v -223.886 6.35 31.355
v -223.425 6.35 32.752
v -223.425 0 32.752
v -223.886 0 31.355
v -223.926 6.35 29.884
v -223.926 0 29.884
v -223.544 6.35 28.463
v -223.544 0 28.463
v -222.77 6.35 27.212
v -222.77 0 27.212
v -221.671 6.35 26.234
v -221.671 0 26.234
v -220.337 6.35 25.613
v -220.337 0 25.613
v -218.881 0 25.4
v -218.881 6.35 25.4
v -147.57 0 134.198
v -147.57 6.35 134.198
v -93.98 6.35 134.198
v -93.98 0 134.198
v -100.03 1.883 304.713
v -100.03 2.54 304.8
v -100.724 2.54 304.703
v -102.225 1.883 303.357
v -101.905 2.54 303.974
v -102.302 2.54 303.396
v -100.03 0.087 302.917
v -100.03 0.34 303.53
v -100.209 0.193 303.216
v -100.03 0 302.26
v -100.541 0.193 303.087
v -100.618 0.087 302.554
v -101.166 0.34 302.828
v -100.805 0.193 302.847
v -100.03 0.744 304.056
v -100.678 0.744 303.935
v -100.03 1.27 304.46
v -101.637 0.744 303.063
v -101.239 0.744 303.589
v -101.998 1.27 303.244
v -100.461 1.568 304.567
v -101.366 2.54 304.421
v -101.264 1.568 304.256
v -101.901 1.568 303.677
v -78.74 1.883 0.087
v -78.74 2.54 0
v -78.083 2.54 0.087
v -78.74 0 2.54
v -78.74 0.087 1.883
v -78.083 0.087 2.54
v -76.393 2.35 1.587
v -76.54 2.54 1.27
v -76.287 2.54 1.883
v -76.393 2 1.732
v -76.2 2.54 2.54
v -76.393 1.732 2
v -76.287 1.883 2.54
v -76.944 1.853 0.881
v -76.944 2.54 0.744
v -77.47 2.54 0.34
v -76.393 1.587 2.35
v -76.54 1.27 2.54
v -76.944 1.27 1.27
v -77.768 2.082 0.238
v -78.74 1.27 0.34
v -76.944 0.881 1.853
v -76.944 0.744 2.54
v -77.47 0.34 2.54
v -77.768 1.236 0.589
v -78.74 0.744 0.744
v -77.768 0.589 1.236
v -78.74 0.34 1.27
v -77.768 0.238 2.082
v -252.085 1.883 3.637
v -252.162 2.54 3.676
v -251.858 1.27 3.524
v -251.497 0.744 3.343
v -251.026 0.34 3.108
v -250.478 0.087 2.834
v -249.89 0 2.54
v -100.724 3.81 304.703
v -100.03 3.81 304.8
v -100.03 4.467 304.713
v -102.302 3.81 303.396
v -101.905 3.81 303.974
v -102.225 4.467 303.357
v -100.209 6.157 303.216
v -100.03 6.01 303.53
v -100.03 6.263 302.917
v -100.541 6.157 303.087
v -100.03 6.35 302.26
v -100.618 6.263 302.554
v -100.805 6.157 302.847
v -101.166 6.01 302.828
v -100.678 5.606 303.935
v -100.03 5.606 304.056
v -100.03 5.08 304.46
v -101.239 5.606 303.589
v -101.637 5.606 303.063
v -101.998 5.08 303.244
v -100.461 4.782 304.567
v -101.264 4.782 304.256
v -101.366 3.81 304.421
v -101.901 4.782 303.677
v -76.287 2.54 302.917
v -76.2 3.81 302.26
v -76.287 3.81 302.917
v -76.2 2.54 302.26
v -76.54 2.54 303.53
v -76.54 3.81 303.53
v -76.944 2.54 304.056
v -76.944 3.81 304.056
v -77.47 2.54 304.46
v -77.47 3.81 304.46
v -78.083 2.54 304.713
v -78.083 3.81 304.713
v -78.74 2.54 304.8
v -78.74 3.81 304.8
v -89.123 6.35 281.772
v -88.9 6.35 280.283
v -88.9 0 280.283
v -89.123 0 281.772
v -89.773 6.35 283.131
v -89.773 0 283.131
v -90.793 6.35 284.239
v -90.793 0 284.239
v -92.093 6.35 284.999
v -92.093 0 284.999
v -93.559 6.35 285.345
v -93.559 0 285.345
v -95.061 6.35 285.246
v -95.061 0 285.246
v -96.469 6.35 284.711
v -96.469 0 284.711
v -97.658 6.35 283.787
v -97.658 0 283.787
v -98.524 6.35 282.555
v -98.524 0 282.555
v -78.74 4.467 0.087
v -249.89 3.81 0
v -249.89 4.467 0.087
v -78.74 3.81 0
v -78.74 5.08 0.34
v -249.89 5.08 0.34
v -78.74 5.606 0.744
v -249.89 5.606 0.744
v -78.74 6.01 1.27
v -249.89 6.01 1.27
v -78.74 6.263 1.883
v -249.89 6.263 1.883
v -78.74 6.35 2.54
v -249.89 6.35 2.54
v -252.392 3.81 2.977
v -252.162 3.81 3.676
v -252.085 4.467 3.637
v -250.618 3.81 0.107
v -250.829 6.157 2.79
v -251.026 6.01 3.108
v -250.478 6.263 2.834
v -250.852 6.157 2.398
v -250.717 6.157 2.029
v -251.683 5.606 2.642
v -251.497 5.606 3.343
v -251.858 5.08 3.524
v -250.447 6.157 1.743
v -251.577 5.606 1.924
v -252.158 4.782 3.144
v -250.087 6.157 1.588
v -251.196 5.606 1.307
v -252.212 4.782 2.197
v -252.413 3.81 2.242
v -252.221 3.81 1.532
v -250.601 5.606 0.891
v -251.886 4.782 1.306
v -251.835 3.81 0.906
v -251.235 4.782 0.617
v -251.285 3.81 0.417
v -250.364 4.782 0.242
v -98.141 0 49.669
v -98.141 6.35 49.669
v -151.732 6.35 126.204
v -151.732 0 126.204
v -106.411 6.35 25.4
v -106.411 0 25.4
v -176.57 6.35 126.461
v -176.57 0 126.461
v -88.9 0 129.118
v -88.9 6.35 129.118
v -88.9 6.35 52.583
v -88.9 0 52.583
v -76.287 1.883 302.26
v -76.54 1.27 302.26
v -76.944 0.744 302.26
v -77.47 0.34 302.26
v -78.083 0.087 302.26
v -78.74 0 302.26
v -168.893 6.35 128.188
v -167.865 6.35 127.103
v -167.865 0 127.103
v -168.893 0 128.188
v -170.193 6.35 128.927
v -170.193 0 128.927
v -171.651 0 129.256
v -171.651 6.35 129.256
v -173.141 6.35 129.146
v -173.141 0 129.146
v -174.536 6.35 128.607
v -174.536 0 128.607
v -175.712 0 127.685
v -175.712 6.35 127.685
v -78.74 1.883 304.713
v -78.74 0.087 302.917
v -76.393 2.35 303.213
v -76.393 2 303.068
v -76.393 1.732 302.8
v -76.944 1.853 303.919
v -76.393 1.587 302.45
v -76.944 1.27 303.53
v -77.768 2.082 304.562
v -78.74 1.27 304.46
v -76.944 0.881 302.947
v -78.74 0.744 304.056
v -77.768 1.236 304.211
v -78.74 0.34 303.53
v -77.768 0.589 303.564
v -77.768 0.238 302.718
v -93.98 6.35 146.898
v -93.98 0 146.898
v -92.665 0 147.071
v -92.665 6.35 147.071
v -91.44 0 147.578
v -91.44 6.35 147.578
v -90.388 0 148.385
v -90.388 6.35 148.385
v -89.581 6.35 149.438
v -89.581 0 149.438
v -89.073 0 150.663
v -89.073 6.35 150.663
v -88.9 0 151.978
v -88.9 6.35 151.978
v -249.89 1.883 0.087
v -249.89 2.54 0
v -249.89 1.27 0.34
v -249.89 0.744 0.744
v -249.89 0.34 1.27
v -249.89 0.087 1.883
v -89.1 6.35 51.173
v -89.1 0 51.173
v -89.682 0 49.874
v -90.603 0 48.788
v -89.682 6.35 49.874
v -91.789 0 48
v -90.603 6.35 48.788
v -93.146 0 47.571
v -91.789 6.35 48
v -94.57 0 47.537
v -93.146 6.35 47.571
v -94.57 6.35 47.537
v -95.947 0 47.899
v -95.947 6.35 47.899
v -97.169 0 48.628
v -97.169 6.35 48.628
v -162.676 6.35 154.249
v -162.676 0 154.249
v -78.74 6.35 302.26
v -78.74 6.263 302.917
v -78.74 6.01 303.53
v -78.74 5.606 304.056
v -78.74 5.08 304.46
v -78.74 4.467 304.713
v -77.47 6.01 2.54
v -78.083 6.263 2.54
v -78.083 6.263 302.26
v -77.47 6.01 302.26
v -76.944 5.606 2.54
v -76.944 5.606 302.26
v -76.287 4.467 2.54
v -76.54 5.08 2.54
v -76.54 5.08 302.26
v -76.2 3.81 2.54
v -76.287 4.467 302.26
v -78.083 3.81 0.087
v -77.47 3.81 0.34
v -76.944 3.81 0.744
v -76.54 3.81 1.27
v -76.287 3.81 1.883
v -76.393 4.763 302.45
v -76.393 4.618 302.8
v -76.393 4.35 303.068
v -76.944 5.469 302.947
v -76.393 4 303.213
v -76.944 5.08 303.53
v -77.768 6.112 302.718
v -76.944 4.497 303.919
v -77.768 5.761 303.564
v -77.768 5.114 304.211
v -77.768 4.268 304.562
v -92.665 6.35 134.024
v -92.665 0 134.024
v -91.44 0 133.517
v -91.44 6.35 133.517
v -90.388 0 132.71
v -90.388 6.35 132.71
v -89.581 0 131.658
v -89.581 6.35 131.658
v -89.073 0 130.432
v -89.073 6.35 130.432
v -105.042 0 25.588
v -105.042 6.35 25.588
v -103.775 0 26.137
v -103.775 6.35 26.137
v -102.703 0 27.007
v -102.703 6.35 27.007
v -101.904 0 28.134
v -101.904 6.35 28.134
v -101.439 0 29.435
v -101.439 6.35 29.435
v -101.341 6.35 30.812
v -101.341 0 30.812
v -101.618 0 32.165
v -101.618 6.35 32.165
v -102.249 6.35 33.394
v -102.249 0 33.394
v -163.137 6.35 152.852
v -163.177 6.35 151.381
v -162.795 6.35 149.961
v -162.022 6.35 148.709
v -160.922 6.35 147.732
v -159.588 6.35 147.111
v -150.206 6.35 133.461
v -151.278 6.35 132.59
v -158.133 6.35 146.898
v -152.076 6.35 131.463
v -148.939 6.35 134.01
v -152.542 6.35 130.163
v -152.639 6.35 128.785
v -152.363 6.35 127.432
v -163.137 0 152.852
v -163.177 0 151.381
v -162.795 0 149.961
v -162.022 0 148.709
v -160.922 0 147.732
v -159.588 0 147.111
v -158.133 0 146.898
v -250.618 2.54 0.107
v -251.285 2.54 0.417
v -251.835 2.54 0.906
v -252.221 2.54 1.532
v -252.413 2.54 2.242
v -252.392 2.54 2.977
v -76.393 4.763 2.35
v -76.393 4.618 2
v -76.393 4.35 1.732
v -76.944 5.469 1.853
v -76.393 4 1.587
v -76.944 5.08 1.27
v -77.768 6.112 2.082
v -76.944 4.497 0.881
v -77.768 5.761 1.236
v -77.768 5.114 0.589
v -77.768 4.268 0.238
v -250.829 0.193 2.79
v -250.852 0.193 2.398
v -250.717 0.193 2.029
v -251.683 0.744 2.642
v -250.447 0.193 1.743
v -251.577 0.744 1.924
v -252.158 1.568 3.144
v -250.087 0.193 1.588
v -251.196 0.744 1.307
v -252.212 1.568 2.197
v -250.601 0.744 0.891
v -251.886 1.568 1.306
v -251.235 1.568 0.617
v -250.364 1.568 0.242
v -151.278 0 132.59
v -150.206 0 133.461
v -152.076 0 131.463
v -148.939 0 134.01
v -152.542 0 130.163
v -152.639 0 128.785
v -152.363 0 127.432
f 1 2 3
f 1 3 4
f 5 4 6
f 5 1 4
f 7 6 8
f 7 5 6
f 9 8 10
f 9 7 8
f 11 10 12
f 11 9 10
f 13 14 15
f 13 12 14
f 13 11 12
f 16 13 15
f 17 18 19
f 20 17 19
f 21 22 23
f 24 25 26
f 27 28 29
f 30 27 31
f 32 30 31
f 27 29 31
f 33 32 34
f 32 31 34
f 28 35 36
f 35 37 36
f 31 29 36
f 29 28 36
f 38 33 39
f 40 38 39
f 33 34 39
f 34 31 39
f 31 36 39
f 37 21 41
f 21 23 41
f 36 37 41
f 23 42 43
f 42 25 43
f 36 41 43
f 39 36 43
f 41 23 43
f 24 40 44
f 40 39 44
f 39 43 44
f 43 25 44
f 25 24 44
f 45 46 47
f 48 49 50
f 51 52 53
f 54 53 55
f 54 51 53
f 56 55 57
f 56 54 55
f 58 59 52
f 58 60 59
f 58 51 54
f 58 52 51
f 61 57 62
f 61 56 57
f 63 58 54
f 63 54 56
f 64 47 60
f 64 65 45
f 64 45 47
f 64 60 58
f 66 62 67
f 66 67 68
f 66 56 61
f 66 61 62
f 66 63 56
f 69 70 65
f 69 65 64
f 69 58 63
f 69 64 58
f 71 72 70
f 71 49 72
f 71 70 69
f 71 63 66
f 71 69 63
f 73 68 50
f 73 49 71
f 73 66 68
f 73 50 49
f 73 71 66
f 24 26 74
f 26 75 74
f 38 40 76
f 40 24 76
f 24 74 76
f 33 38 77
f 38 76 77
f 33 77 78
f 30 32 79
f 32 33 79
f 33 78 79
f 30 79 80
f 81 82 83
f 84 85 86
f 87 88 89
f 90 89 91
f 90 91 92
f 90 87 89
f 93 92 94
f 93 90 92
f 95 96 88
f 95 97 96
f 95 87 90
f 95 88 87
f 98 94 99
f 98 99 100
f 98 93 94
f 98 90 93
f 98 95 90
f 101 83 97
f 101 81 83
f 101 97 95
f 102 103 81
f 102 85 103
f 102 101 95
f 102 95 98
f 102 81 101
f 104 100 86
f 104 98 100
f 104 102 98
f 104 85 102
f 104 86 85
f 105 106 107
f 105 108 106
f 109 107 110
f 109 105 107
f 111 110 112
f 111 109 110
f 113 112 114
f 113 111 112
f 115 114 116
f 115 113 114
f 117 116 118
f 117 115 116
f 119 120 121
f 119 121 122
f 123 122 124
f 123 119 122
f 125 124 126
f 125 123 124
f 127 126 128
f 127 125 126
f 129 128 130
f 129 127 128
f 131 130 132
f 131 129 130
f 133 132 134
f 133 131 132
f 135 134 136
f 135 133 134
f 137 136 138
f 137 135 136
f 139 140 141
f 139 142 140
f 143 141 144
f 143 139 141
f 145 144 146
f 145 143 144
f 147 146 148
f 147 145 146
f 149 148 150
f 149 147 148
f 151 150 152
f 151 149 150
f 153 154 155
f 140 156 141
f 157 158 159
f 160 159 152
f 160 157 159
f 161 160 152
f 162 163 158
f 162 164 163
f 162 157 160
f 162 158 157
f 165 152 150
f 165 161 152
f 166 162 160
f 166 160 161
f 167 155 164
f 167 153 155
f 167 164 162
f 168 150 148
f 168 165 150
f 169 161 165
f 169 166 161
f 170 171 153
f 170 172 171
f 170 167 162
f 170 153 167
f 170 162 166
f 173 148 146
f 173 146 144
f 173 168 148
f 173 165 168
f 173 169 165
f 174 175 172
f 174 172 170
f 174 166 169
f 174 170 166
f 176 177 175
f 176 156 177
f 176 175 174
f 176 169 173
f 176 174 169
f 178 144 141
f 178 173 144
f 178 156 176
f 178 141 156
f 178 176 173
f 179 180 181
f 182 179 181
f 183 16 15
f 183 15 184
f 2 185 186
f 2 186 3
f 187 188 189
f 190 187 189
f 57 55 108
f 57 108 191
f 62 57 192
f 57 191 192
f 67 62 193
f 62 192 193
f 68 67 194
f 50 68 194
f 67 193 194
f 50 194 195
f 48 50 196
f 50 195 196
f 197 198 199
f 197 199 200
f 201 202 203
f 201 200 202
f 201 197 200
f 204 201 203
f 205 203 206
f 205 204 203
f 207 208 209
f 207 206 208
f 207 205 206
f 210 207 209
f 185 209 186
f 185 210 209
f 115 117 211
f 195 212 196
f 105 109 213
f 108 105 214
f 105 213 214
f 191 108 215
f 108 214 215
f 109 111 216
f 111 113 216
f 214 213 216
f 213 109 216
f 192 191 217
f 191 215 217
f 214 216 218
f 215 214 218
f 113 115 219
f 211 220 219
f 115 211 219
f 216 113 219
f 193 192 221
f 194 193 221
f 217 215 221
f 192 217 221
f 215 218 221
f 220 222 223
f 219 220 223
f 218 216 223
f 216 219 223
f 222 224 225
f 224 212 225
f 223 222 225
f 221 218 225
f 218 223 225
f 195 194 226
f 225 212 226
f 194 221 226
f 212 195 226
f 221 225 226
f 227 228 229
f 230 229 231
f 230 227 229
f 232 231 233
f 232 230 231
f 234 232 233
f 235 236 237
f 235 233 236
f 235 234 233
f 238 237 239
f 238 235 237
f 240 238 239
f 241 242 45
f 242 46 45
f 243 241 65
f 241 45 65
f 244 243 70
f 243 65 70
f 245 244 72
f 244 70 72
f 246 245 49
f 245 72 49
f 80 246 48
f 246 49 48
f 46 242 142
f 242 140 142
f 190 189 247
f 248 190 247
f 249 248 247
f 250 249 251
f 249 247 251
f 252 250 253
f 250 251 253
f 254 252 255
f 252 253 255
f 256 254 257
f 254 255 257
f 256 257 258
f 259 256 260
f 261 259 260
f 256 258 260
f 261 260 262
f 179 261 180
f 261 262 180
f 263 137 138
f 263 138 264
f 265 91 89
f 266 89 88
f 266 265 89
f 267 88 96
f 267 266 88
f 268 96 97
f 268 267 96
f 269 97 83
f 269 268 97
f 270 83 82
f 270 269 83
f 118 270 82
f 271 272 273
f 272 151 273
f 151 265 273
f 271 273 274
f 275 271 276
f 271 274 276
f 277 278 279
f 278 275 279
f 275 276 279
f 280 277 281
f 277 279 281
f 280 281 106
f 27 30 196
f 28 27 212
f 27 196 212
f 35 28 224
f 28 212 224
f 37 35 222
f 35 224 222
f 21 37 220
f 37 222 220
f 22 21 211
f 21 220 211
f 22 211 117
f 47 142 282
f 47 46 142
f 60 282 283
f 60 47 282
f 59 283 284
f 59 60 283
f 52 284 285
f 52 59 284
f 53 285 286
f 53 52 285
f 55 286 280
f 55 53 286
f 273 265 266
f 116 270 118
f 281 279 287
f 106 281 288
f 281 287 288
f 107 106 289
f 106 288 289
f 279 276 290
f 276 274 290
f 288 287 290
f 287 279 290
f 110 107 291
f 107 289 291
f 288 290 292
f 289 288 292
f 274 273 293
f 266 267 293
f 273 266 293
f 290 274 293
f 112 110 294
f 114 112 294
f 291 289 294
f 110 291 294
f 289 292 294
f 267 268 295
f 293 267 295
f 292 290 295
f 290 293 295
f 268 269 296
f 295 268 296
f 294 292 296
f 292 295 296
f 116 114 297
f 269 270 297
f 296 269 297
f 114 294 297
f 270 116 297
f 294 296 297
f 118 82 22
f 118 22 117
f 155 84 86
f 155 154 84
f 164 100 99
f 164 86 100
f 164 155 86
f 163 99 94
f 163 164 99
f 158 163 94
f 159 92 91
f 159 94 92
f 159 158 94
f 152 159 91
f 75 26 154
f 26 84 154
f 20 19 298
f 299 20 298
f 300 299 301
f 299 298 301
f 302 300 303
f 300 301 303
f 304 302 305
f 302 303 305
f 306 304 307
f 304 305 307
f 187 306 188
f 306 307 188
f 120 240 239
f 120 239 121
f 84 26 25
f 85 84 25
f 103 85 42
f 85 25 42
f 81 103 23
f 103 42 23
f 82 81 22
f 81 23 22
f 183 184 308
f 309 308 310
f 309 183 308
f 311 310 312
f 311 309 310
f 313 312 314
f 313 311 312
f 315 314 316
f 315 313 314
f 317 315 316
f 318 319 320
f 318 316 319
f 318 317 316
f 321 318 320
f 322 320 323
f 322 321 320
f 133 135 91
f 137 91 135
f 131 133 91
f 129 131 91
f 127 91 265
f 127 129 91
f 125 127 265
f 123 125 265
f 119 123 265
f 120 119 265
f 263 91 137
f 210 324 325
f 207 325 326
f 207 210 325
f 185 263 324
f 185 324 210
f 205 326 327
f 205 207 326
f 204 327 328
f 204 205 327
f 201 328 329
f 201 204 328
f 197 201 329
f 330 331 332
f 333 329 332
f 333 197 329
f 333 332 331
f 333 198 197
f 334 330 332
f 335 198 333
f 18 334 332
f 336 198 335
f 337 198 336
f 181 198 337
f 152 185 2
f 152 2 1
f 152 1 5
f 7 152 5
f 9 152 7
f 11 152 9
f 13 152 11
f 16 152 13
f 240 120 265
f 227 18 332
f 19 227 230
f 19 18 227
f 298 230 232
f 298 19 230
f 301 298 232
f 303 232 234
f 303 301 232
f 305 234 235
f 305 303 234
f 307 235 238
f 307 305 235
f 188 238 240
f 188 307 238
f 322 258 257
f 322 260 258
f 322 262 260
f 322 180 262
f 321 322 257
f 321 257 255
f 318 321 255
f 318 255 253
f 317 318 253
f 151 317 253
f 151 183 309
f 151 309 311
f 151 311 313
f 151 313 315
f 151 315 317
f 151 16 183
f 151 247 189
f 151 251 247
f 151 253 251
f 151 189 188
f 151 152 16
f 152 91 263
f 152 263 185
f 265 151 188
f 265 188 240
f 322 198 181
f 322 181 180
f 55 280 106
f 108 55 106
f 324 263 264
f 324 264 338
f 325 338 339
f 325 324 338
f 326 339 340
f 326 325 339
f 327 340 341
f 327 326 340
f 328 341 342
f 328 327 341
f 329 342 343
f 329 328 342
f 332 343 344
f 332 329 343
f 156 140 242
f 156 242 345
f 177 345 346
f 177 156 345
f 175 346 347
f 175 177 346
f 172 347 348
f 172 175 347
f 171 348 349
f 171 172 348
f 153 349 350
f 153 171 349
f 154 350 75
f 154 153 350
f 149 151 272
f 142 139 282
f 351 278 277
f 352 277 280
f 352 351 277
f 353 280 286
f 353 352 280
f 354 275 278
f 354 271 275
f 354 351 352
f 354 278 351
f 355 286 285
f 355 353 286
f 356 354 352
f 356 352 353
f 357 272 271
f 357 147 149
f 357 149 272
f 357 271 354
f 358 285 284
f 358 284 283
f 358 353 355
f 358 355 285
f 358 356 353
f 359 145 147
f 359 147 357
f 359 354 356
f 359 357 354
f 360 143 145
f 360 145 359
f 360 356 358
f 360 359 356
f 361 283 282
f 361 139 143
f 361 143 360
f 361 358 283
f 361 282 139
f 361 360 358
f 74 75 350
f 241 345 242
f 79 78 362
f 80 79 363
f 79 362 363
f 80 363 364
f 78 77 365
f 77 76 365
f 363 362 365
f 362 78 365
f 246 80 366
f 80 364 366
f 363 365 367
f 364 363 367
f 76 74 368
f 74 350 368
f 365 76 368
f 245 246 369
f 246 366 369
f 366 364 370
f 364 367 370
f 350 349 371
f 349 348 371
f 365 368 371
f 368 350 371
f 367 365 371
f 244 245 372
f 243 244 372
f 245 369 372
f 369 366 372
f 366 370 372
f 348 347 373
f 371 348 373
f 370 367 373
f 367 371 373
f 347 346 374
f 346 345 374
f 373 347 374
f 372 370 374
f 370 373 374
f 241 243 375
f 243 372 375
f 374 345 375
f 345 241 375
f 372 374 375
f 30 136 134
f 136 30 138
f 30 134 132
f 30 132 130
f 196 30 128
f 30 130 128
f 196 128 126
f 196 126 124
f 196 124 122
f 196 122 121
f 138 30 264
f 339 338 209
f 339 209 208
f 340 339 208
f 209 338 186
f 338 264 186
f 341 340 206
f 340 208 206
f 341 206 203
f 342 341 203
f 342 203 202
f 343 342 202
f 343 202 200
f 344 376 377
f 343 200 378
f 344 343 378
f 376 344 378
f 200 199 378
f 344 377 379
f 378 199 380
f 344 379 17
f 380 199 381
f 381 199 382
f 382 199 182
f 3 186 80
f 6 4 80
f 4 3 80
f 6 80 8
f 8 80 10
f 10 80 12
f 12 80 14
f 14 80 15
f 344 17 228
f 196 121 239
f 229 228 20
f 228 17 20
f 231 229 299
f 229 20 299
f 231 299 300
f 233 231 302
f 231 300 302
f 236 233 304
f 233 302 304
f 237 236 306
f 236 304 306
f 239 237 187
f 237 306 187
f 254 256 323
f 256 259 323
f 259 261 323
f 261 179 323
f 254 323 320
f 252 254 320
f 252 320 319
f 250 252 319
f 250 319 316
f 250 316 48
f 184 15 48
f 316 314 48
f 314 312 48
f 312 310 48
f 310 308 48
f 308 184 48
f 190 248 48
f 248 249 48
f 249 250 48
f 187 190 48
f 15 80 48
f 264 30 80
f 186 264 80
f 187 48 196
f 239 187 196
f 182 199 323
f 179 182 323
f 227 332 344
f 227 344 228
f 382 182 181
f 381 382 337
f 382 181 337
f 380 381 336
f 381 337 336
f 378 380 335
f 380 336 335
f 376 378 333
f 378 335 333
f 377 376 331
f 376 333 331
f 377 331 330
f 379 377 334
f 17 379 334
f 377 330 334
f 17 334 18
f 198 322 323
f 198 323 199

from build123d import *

# Parameters (mm, degrees)
SKETCH1_W           = 254
SKETCH1_H           = 6.35
BOSS_EXTRUDE1_DEPTH = 304.8
CUT_EXTRUDE1_DEPTH  = 304.8
CUT_EXTRUDE2_DEPTH  = 397.811494919
CUT_EXTRUDE3_REACH  = 398.811
FILLET2_R           = 2.54


with BuildPart() as part:
    # Sketch1 → Boss-Extrude1 (new body)
    with BuildSketch(Plane.XY):
        with Locations((-127, 3.175)):
            Rectangle(SKETCH1_W, SKETCH1_H)
    extrude(amount=BOSS_EXTRUDE1_DEPTH)

    # Sketch2 → Cut-Extrude1 (cut)
    with BuildSketch(Plane(origin=(0, 6.35, 0), x_dir=(1, 0, 0), z_dir=(0, 1, 0))):
        Polygon((-101.6, -304.8), (-254, 0), (-254, -304.8), align=None)
    extrude(amount=-CUT_EXTRUDE1_DEPTH, mode=Mode.SUBTRACT)

    # Sketch4 → Cut-Extrude2 (cut, through all)
    with BuildSketch(Plane(origin=(0, 6.35, 0), x_dir=(1, 0, 0), z_dir=(0, 1, 0))):
        Polygon((-76.2, -127), (-76.2, 0), (0, 0), (0, -304.8), (-76.2, -304.8), (-76.2, -177.8), align=None)
    extrude(amount=-CUT_EXTRUDE2_DEPTH, mode=Mode.SUBTRACT)

    # Sketch9 → Cut-Extrude3 (cut, up to next)
    with BuildSketch(Plane(origin=(0, 6.35, 0), x_dir=(1, 0, 0), z_dir=(0, 1, 0)), mode=Mode.PRIVATE) as cut_extrude3_sk1:
        with BuildLine():
            Line((-102.249215459, -33.393768297), (-167.865313489, -127.103267909))
            ThreePointArc((-167.865313489, -127.103267909), (-172.400201066, -129.255743451), (-176.570296004, -126.461344677))
            Line((-176.570296004, -126.461344677), (-223.42504581, -32.751845065))
            ThreePointArc((-223.42504581, -32.751845065), (-223.202661786, -27.80928595), (-218.88135568, -25.4))
            Line((-218.88135568, -25.4), (-106.410507844, -25.4))
            ThreePointArc((-106.410507844, -25.4), (-101.904492811, -28.134317045), (-102.249215459, -33.393768297))
        make_face()
    cut_extrude3_tool1 = extrude(cut_extrude3_sk1.sketch, amount=-CUT_EXTRUDE3_REACH, mode=Mode.PRIVATE) & part.part
    # Sketch9 → Cut-Extrude3 (cut, up to next)
    with BuildSketch(Plane(origin=(0, 6.35, 0), x_dir=(1, 0, 0), z_dir=(0, 1, 0)), mode=Mode.PRIVATE) as cut_extrude3_sk2:
        with BuildLine():
            Line((-158.13257617, -146.897559021), (-93.98, -146.897559021))
            ThreePointArc((-93.98, -146.897559021), (-90.387897552, -148.385456572), (-88.9, -151.977559021))
            Line((-88.9, -151.977559021), (-88.9, -280.28271136))
            ThreePointArc((-88.9, -280.28271136), (-92.812855164, -285.226816227), (-98.52369013, -282.554556425))
            Line((-98.52369013, -282.554556425), (-162.6762663, -154.249404086))
            ThreePointArc((-162.6762663, -154.249404086), (-162.453882276, -149.306844971), (-158.13257617, -146.897559021))
        make_face()
    cut_extrude3_tool2 = extrude(cut_extrude3_sk2.sketch, amount=-CUT_EXTRUDE3_REACH, mode=Mode.PRIVATE) & part.part
    # Sketch9 → Cut-Extrude3 (cut, up to next)
    with BuildSketch(Plane(origin=(0, 6.35, 0), x_dir=(1, 0, 0), z_dir=(0, 1, 0)), mode=Mode.PRIVATE) as cut_extrude3_sk3:
        with BuildLine():
            Line((-98.141292385, -49.668820452), (-151.731655506, -126.203790724))
            ThreePointArc((-151.731655506, -126.203790724), (-152.076378154, -131.463241976), (-147.570363121, -134.197559021))
            Line((-147.570363121, -134.197559021), (-93.98, -134.197559021))
            ThreePointArc((-93.98, -134.197559021), (-90.387897552, -132.709661469), (-88.9, -129.117559021))
            Line((-88.9, -129.117559021), (-88.9, -52.582588748))
            ThreePointArc((-88.9, -52.582588748), (-92.452414539, -47.737706638), (-98.141292385, -49.668820452))
        make_face()
    cut_extrude3_tool3 = extrude(cut_extrude3_sk3.sketch, amount=-CUT_EXTRUDE3_REACH, mode=Mode.PRIVATE) & part.part
    add(cut_extrude3_tool1.solids().sort_by_distance((-165.555188, 6.35, 61.646702))[0], mode=Mode.SUBTRACT)
    add(cut_extrude3_tool2.solids().sort_by_distance((-114.904844, 6.35, 197.54946))[0], mode=Mode.SUBTRACT)
    add(cut_extrude3_tool3.solids().sort_by_distance((-111.777944, 6.35, 102.228886))[0], mode=Mode.SUBTRACT)

    # Fillet2
    fillet2_edges = [part.edges().sort_by_distance(p)[0] for p in [
        (-177.8, 0, 152.4),
        (-177.8, 6.35, 152.4),
        (-101.6, 3.175, 304.8),
        (-165.1, 0, 0),
        (-165.1, 6.35, 0),
        (-88.9, 6.35, 304.8),
        (-88.9, 0, 304.8),
        (-76.2, 6.35, 152.4),
        (-76.2, 3.175, 304.8),
        (-76.2, 3.175, 0),
        (-76.2, 0, 152.4),
        (-254, 3.175, 0),
    ]]
    fillet(fillet2_edges, radius=FILLET2_R)


solid = part.part
